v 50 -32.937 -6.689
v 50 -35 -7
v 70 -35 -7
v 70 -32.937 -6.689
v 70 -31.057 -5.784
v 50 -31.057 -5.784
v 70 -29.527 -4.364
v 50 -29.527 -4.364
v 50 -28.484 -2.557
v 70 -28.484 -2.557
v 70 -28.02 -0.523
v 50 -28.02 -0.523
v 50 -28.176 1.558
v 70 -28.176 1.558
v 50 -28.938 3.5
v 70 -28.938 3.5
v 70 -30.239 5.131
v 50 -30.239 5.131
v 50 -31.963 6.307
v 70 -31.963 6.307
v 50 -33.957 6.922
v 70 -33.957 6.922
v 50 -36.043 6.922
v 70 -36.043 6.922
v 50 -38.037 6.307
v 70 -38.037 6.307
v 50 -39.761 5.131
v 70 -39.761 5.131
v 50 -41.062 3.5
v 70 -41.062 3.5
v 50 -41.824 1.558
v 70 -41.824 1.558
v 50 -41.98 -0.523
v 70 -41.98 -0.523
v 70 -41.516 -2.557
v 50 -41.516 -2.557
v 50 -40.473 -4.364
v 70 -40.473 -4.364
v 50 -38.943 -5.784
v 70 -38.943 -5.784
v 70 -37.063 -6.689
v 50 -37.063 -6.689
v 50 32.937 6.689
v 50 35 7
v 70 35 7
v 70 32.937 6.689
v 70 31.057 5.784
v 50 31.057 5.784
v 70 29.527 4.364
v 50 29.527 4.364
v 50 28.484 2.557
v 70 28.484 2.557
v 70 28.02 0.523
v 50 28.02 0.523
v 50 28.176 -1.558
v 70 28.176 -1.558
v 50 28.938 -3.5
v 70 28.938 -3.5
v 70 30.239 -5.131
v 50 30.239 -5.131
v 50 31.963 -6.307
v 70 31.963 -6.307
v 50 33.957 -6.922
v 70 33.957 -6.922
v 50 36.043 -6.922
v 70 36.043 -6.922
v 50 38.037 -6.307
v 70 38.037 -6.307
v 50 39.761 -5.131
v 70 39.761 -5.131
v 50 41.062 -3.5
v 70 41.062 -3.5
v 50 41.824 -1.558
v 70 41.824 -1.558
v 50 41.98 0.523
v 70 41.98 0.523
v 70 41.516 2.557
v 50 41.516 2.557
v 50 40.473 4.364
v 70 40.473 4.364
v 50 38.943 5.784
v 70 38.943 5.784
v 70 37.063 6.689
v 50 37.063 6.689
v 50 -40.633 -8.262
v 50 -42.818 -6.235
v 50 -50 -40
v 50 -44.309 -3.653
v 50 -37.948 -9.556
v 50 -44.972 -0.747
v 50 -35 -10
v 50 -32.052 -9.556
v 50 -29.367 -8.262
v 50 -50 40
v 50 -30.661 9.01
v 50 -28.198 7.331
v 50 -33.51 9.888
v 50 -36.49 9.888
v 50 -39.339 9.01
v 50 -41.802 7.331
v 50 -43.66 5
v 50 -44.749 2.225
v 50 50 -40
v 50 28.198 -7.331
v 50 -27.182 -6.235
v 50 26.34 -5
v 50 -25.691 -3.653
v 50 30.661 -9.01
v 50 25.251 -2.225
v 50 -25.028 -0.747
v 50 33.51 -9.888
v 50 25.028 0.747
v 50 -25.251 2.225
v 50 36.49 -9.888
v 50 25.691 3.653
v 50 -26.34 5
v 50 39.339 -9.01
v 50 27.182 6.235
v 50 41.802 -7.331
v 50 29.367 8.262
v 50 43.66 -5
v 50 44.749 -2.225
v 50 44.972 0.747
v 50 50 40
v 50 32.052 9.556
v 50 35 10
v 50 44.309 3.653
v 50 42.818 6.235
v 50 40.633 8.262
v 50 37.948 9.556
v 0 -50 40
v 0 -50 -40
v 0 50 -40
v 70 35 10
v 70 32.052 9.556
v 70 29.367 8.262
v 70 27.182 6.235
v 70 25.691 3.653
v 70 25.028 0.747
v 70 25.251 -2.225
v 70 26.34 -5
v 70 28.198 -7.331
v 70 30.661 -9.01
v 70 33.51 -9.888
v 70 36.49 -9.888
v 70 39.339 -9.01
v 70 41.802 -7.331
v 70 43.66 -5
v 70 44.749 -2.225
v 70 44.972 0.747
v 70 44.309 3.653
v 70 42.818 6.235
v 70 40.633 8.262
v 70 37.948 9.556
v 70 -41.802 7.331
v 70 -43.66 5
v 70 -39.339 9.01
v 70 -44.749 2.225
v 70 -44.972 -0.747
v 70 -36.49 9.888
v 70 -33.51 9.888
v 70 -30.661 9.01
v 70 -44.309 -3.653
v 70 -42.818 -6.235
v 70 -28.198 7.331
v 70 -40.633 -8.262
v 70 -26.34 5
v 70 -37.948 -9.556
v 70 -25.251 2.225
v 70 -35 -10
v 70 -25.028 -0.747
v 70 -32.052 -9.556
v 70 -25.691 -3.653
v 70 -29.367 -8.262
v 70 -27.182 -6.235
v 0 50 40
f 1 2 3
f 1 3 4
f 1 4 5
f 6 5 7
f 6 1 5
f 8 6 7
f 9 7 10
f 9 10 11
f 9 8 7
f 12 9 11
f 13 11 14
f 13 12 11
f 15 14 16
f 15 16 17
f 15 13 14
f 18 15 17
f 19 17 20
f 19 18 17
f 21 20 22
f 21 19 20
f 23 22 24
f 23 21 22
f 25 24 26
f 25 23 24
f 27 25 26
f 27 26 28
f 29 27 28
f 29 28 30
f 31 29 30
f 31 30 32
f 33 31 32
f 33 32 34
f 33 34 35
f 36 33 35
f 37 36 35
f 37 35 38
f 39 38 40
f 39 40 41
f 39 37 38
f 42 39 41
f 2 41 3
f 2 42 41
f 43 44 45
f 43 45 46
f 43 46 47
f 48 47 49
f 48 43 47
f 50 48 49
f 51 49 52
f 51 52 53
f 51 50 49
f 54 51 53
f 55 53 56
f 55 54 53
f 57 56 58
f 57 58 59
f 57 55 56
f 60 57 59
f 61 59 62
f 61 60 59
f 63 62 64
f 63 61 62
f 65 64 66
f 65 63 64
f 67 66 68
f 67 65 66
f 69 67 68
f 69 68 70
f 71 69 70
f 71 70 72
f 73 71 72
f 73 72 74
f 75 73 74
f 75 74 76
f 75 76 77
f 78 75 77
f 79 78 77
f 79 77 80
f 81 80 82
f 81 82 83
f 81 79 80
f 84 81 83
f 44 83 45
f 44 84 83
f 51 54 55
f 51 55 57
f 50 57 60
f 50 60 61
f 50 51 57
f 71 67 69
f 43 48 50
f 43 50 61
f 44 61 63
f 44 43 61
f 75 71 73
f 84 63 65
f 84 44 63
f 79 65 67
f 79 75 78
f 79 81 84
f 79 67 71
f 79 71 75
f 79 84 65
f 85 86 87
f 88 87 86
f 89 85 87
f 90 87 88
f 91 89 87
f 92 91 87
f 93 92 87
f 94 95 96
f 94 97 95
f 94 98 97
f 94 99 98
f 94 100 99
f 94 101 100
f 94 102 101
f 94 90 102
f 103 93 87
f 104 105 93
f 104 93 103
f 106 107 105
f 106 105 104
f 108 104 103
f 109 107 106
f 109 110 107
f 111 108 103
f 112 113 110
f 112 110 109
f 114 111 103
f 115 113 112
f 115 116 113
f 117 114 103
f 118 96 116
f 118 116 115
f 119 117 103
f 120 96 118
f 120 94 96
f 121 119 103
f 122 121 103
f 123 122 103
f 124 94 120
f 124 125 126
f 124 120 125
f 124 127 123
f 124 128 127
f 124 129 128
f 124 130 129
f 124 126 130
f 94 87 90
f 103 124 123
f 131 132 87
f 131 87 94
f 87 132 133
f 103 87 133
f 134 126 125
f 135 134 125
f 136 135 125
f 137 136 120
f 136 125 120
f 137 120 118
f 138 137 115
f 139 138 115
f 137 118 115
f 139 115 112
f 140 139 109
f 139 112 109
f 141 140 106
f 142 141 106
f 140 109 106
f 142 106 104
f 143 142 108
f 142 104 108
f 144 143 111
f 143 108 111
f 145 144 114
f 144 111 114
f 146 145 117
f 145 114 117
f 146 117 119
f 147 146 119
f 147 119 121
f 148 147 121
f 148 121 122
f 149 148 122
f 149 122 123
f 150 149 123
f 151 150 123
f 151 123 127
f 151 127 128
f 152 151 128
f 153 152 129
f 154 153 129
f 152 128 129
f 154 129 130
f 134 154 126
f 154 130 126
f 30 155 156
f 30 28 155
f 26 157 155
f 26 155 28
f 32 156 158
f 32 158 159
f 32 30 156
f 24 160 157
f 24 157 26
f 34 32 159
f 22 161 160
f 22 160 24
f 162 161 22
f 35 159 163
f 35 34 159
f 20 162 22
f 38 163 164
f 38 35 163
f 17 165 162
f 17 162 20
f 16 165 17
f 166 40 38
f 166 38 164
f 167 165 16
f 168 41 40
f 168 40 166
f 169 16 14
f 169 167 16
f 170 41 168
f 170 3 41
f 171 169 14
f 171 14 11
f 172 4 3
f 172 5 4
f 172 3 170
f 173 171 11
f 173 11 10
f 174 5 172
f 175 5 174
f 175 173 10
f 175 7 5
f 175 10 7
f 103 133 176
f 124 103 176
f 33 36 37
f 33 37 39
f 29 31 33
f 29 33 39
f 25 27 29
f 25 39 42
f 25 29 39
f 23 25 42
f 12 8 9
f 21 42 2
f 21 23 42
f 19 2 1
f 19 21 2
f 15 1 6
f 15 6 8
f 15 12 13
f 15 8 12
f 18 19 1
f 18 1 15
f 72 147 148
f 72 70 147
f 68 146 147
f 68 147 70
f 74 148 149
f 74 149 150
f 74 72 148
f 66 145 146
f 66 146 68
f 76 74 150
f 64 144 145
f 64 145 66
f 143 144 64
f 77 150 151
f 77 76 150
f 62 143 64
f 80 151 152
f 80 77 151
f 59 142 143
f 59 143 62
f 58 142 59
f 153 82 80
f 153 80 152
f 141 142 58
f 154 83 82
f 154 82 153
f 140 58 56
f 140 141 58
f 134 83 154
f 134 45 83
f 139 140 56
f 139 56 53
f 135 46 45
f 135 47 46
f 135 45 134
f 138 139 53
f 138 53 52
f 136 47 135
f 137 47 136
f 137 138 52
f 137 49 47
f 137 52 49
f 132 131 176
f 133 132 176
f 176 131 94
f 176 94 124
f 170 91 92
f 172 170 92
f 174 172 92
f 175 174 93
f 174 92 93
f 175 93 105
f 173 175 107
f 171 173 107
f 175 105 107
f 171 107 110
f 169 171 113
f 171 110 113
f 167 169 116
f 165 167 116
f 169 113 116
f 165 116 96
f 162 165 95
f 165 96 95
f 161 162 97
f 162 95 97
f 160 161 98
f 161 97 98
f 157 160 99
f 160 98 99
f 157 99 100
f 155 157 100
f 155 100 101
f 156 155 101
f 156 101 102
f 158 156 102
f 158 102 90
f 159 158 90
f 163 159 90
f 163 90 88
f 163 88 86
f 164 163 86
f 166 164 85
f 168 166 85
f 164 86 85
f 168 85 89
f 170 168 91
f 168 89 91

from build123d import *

# Parameters (mm, degrees)
SKETCH1_W           = 100
SKETCH1_H           = 80
BOSS_EXTRUDE1_DEPTH = 50
SKETCH2_R           = 10
SKETCH2_R_2         = 7
BOSS_EXTRUDE2_DEPTH = 20


with BuildPart() as part:
    # Sketch1 → Boss-Extrude1 (new body)
    with BuildSketch(Plane.YZ):
        Rectangle(SKETCH1_W, SKETCH1_H)
    extrude(amount=BOSS_EXTRUDE1_DEPTH)

    # Sketch2 → Boss-Extrude2 (add)
    # profile 1 of 2: a face of its own
    with BuildSketch(Plane.YZ.offset(50)):
        with Locations(Location((-35, 0, 0), (0, 0, 270))):
            Circle(SKETCH2_R)
        with Locations(Location((-35, 0, 0), (0, 0, 270))):
            Circle(SKETCH2_R_2, mode=Mode.SUBTRACT)
    # profile 2 of 2: a face of its own
    with BuildSketch(Plane.YZ.offset(50)):
        with Locations(Location((35, 0, 0), (0, 0, 90))):
            Circle(SKETCH2_R)
        with Locations(Location((35, 0, 0), (0, 0, 90))):
            Circle(SKETCH2_R_2, mode=Mode.SUBTRACT)
    extrude(amount=BOSS_EXTRUDE2_DEPTH)


solid = part.part
